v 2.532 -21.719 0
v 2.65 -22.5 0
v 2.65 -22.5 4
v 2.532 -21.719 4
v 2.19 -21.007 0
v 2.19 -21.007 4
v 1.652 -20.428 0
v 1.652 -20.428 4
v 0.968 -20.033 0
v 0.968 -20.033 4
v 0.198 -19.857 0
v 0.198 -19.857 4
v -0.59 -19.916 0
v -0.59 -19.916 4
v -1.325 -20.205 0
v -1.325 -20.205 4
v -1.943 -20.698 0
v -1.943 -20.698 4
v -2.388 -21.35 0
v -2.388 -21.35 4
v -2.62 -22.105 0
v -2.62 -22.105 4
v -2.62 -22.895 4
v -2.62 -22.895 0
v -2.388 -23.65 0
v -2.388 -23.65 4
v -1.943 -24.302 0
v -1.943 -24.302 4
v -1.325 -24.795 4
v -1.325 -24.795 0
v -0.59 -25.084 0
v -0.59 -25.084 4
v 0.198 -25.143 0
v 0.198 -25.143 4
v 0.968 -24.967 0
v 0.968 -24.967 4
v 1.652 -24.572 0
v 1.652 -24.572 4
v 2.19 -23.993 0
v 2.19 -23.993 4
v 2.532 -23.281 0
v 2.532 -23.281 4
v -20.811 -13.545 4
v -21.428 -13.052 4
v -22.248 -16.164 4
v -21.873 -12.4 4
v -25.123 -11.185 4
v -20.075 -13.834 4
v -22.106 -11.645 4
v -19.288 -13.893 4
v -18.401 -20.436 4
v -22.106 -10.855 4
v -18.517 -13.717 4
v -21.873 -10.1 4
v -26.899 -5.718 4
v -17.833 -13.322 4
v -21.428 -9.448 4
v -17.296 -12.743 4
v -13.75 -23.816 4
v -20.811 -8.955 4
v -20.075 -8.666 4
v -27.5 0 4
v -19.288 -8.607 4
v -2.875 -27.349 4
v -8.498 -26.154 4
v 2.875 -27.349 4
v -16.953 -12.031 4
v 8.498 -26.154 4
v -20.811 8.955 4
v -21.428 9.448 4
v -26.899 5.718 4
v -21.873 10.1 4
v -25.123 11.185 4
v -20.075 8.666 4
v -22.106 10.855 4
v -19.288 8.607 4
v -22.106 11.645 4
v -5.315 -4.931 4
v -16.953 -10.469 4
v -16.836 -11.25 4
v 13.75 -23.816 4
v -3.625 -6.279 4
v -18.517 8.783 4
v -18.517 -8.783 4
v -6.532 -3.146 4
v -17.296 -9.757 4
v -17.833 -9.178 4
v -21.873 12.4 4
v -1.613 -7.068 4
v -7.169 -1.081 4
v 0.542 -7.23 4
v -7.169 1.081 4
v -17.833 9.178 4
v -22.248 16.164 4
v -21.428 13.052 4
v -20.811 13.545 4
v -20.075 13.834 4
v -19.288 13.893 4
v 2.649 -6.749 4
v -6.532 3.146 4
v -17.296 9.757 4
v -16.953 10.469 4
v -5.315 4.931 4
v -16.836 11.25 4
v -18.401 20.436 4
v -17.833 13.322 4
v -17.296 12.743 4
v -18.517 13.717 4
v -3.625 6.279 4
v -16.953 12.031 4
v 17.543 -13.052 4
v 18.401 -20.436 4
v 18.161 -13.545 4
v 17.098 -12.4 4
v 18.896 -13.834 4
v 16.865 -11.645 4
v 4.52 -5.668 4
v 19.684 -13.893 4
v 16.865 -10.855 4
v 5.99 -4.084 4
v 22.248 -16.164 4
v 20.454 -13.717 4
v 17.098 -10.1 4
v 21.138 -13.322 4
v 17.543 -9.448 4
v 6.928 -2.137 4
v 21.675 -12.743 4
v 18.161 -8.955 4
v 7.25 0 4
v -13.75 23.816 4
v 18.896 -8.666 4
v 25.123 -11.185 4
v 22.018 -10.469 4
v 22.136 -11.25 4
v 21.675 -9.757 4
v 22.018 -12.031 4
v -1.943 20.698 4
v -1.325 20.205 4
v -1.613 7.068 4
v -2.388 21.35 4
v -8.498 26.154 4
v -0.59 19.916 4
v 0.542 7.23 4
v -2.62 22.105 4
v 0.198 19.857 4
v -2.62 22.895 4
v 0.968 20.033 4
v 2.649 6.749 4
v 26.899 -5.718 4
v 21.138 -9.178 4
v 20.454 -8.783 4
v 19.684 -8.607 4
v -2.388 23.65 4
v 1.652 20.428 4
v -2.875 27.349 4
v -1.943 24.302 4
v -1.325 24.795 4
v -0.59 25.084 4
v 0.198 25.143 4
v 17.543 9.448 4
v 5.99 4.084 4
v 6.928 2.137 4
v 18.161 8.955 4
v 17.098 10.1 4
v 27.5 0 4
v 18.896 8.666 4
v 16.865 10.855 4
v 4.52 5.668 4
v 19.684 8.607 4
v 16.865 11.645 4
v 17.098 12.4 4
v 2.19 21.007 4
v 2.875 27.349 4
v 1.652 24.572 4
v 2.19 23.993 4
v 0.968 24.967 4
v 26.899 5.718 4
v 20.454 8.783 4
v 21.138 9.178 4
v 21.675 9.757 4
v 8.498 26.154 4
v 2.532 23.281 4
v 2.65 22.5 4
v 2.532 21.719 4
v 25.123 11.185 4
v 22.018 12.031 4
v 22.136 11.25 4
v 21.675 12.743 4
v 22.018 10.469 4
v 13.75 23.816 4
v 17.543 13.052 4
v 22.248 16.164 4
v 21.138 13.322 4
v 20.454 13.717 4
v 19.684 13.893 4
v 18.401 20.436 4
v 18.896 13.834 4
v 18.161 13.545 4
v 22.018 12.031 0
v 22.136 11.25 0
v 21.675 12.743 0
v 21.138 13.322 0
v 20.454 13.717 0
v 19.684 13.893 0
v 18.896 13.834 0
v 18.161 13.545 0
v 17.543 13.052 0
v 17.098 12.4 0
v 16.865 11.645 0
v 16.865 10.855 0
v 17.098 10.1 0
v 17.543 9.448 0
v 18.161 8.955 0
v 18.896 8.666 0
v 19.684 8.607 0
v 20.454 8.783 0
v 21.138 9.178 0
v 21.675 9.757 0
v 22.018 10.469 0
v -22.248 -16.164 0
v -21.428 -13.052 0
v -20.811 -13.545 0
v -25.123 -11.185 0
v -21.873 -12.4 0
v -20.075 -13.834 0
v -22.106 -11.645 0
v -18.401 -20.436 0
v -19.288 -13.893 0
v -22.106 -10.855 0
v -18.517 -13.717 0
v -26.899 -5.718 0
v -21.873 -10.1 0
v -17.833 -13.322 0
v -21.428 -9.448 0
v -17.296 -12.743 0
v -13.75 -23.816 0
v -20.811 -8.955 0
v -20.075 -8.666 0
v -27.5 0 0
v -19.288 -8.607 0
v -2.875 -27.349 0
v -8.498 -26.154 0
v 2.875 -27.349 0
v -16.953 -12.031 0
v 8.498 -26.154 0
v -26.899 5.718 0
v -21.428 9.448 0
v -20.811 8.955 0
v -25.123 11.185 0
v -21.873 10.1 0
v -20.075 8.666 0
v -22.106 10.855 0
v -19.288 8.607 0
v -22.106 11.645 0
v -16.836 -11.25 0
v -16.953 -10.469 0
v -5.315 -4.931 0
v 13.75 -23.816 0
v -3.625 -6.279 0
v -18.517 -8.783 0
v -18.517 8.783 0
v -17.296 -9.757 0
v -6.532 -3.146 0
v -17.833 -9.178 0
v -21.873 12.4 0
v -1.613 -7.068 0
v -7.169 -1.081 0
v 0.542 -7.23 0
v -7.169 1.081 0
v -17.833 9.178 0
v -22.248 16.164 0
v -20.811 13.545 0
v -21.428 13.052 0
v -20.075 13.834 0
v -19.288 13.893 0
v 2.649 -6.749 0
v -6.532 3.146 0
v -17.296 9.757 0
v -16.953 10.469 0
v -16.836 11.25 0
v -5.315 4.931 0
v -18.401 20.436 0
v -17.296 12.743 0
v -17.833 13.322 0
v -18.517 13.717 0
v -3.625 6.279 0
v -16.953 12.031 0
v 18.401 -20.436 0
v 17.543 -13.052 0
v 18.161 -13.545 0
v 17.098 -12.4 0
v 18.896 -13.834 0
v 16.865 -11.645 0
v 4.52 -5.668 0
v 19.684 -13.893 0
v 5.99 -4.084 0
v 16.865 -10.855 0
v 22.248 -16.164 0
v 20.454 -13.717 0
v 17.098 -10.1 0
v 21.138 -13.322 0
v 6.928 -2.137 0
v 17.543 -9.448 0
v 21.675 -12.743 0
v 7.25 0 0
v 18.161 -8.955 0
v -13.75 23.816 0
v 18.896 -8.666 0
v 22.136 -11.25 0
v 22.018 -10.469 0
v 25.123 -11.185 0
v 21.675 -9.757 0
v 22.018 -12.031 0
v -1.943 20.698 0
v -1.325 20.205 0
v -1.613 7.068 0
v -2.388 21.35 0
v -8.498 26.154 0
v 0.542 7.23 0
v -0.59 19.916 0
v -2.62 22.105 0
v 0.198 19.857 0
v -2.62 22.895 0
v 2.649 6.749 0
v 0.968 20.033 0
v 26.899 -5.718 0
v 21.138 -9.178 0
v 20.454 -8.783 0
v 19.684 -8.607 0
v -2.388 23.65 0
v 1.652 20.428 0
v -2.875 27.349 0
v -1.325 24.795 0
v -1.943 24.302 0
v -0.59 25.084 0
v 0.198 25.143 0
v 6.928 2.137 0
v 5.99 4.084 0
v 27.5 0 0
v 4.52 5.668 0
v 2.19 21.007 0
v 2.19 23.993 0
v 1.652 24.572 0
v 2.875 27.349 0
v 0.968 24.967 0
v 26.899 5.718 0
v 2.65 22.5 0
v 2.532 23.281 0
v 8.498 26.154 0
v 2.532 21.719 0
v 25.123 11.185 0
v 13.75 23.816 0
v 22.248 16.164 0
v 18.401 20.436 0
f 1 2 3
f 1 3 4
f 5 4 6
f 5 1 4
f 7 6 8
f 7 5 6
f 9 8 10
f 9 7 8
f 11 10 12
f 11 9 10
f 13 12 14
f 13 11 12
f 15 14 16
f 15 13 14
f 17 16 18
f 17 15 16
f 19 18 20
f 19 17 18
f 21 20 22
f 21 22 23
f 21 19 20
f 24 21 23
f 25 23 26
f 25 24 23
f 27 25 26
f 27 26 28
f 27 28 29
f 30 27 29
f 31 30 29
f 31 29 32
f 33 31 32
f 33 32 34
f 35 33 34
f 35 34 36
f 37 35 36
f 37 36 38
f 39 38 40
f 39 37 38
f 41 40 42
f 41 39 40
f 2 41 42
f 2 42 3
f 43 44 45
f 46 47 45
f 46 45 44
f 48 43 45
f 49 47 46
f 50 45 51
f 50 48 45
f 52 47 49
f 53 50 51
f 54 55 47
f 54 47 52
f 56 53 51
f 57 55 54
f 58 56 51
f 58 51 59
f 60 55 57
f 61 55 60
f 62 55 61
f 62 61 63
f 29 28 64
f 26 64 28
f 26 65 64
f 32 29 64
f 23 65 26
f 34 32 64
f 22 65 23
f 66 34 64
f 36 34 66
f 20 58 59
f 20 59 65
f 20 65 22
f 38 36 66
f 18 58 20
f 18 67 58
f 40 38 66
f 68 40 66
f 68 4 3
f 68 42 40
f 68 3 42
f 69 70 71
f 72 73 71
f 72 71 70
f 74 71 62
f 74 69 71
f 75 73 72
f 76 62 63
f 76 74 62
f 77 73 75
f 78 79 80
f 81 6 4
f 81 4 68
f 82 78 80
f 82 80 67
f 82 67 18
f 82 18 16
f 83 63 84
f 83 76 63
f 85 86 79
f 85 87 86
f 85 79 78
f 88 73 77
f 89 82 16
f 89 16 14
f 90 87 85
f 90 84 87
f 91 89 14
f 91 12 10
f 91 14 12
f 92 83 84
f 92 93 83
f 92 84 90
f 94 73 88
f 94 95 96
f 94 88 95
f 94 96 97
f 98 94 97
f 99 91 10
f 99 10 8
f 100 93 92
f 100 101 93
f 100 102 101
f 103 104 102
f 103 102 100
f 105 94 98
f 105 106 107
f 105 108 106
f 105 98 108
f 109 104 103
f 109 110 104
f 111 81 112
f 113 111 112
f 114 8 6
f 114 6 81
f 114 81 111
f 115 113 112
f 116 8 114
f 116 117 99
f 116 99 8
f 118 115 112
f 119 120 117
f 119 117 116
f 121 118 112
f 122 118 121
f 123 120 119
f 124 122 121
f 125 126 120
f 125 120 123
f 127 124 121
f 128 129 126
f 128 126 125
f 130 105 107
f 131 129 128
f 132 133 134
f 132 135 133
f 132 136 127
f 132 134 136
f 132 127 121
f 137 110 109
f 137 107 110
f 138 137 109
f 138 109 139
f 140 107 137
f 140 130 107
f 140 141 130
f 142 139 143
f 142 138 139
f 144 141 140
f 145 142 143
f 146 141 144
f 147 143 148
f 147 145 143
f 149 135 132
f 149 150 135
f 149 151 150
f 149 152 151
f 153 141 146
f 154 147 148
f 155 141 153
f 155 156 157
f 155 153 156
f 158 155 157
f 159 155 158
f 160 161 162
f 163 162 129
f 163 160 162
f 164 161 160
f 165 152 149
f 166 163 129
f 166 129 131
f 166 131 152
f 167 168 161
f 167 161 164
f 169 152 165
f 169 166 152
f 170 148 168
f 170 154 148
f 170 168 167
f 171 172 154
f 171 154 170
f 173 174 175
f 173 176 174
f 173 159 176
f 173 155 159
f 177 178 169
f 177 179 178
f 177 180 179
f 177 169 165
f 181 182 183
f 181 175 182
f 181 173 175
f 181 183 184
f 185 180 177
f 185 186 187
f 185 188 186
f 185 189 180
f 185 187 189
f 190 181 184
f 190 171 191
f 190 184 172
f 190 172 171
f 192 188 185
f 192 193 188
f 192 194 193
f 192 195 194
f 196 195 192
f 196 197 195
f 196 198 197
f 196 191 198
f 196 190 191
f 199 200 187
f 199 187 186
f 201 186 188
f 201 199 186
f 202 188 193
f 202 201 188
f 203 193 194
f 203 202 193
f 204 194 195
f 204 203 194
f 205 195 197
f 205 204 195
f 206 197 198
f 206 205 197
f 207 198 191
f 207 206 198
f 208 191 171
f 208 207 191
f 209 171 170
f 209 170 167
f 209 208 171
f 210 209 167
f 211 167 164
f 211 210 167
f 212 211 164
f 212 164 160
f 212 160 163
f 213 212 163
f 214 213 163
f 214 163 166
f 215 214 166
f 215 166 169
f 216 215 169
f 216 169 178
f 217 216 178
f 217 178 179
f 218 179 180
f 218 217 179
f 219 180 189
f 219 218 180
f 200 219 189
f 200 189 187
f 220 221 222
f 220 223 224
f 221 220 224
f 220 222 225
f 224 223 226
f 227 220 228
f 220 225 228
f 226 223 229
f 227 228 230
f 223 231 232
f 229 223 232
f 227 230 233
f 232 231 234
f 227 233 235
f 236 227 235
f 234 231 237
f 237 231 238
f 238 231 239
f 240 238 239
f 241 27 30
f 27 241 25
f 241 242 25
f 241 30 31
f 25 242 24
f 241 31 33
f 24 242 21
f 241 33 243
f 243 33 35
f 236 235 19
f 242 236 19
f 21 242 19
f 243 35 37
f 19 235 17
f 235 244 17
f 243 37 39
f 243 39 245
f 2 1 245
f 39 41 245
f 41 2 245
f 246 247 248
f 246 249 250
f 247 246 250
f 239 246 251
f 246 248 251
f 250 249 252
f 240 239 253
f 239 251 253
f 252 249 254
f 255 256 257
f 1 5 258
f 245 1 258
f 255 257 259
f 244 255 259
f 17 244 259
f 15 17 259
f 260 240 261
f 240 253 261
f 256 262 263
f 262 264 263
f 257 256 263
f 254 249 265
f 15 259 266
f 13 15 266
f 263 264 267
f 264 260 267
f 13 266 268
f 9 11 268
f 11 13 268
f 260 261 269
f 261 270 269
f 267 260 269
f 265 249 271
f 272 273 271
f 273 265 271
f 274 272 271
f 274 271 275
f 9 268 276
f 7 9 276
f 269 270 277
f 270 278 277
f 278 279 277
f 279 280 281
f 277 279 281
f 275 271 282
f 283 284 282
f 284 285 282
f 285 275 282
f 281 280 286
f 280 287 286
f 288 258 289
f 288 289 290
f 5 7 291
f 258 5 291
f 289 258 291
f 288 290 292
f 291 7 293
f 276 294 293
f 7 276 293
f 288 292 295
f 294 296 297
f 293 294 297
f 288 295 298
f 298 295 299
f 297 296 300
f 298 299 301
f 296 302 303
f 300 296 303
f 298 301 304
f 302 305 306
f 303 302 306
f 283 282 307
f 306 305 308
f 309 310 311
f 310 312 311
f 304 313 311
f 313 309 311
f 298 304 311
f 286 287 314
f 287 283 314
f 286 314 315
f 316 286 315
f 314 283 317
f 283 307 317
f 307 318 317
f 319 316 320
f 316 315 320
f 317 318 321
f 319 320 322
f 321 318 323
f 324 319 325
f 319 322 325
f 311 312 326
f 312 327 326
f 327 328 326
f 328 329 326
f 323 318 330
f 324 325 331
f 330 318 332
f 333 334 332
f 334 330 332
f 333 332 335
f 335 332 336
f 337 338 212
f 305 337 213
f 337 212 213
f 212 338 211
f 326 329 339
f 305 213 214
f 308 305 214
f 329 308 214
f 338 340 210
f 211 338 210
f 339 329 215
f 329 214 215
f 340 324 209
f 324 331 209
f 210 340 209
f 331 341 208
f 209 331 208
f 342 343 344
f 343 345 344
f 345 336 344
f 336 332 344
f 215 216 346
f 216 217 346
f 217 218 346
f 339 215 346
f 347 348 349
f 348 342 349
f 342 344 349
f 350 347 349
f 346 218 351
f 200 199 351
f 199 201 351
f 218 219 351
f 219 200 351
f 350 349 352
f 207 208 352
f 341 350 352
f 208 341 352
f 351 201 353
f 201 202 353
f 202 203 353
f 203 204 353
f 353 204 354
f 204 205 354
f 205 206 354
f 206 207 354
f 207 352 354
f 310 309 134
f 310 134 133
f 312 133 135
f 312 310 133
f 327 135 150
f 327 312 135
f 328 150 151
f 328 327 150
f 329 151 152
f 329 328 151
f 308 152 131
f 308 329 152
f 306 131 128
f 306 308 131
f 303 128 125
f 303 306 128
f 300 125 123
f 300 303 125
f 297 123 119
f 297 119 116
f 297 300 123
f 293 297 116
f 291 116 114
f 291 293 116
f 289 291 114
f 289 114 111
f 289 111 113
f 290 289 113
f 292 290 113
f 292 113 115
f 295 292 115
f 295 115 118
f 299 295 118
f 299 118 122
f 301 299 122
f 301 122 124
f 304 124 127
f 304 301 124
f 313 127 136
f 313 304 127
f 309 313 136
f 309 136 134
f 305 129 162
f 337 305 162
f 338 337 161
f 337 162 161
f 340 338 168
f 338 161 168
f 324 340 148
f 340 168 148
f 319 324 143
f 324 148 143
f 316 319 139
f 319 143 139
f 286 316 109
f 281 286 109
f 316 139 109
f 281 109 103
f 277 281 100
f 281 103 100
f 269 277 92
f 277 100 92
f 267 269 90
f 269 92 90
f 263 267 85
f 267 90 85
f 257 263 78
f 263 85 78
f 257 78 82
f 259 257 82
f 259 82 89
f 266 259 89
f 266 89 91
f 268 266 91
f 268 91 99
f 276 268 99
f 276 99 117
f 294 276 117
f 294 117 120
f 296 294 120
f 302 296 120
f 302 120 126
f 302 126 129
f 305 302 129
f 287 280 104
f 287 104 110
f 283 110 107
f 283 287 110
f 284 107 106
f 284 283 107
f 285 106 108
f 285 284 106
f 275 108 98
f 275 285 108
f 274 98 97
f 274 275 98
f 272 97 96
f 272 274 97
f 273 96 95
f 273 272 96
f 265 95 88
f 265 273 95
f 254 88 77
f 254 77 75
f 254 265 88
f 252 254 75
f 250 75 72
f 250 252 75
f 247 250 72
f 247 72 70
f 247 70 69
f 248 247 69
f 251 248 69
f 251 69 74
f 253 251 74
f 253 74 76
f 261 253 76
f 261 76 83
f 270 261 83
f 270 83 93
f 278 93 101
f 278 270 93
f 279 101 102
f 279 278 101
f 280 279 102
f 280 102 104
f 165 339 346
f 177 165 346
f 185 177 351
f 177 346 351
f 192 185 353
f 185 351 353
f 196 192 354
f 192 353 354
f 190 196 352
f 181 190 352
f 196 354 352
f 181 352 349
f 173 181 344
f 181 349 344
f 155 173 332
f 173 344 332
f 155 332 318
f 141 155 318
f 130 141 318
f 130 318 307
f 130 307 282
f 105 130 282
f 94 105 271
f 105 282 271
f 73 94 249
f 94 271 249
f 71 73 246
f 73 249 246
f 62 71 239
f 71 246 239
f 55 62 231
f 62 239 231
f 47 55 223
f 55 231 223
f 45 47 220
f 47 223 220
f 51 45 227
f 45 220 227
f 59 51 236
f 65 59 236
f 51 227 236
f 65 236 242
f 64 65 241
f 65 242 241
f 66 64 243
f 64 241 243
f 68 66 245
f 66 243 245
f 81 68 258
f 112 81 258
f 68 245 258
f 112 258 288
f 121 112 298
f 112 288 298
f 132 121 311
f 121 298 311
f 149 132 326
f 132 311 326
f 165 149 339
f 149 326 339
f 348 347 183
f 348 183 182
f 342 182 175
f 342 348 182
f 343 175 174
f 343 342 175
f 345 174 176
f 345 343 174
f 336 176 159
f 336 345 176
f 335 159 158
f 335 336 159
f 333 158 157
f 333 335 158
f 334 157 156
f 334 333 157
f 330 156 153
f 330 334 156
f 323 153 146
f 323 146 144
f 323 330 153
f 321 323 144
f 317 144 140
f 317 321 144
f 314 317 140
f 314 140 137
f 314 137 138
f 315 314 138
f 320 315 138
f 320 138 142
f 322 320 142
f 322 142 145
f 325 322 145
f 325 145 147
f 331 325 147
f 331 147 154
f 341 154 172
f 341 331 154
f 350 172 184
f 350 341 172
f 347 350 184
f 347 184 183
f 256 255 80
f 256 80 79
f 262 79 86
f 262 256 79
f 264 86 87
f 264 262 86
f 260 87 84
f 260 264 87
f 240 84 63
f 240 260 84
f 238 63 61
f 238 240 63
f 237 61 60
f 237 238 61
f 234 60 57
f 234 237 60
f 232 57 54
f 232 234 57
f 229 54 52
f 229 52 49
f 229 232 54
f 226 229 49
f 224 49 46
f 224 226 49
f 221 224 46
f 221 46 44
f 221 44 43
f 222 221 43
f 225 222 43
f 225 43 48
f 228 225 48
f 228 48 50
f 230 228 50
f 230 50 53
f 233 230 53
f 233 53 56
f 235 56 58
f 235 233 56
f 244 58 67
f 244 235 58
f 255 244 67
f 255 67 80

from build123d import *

# Parameters (mm, degrees)
SKETCH1_R           = 27.5
SKETCH1_R_2         = 2.65
BOSS_EXTRUDE1_DEPTH = 4
SKETCH2_R           = 7.25
CUT_EXTRUDE1_DEPTH  = 40.096035605


with BuildPart() as part:
    # Sketch1 → Boss-Extrude1 (new body)
    with BuildSketch(Plane.XY):
        Circle(SKETCH1_R)
        with Locations((0, 22.5)):
            Circle(SKETCH1_R_2, mode=Mode.SUBTRACT)
        with Locations((19.485571585, 11.25)):
            Circle(SKETCH1_R_2, mode=Mode.SUBTRACT)
        with Locations((19.485571585, -11.25)):
            Circle(SKETCH1_R_2, mode=Mode.SUBTRACT)
        with Locations((0, -22.5)):
            Circle(SKETCH1_R_2, mode=Mode.SUBTRACT)
        with Locations((-19.485571585, -11.25)):
            Circle(SKETCH1_R_2, mode=Mode.SUBTRACT)
        with Locations((-19.485571585, 11.25)):
            Circle(SKETCH1_R_2, mode=Mode.SUBTRACT)
    extrude(amount=BOSS_EXTRUDE1_DEPTH)

    # Sketch2 → Cut-Extrude1 (cut, through all)
    with BuildSketch(Plane.XY.offset(4)):
        Circle(SKETCH2_R)
    extrude(amount=-CUT_EXTRUDE1_DEPTH, mode=Mode.SUBTRACT)


solid = part.part
